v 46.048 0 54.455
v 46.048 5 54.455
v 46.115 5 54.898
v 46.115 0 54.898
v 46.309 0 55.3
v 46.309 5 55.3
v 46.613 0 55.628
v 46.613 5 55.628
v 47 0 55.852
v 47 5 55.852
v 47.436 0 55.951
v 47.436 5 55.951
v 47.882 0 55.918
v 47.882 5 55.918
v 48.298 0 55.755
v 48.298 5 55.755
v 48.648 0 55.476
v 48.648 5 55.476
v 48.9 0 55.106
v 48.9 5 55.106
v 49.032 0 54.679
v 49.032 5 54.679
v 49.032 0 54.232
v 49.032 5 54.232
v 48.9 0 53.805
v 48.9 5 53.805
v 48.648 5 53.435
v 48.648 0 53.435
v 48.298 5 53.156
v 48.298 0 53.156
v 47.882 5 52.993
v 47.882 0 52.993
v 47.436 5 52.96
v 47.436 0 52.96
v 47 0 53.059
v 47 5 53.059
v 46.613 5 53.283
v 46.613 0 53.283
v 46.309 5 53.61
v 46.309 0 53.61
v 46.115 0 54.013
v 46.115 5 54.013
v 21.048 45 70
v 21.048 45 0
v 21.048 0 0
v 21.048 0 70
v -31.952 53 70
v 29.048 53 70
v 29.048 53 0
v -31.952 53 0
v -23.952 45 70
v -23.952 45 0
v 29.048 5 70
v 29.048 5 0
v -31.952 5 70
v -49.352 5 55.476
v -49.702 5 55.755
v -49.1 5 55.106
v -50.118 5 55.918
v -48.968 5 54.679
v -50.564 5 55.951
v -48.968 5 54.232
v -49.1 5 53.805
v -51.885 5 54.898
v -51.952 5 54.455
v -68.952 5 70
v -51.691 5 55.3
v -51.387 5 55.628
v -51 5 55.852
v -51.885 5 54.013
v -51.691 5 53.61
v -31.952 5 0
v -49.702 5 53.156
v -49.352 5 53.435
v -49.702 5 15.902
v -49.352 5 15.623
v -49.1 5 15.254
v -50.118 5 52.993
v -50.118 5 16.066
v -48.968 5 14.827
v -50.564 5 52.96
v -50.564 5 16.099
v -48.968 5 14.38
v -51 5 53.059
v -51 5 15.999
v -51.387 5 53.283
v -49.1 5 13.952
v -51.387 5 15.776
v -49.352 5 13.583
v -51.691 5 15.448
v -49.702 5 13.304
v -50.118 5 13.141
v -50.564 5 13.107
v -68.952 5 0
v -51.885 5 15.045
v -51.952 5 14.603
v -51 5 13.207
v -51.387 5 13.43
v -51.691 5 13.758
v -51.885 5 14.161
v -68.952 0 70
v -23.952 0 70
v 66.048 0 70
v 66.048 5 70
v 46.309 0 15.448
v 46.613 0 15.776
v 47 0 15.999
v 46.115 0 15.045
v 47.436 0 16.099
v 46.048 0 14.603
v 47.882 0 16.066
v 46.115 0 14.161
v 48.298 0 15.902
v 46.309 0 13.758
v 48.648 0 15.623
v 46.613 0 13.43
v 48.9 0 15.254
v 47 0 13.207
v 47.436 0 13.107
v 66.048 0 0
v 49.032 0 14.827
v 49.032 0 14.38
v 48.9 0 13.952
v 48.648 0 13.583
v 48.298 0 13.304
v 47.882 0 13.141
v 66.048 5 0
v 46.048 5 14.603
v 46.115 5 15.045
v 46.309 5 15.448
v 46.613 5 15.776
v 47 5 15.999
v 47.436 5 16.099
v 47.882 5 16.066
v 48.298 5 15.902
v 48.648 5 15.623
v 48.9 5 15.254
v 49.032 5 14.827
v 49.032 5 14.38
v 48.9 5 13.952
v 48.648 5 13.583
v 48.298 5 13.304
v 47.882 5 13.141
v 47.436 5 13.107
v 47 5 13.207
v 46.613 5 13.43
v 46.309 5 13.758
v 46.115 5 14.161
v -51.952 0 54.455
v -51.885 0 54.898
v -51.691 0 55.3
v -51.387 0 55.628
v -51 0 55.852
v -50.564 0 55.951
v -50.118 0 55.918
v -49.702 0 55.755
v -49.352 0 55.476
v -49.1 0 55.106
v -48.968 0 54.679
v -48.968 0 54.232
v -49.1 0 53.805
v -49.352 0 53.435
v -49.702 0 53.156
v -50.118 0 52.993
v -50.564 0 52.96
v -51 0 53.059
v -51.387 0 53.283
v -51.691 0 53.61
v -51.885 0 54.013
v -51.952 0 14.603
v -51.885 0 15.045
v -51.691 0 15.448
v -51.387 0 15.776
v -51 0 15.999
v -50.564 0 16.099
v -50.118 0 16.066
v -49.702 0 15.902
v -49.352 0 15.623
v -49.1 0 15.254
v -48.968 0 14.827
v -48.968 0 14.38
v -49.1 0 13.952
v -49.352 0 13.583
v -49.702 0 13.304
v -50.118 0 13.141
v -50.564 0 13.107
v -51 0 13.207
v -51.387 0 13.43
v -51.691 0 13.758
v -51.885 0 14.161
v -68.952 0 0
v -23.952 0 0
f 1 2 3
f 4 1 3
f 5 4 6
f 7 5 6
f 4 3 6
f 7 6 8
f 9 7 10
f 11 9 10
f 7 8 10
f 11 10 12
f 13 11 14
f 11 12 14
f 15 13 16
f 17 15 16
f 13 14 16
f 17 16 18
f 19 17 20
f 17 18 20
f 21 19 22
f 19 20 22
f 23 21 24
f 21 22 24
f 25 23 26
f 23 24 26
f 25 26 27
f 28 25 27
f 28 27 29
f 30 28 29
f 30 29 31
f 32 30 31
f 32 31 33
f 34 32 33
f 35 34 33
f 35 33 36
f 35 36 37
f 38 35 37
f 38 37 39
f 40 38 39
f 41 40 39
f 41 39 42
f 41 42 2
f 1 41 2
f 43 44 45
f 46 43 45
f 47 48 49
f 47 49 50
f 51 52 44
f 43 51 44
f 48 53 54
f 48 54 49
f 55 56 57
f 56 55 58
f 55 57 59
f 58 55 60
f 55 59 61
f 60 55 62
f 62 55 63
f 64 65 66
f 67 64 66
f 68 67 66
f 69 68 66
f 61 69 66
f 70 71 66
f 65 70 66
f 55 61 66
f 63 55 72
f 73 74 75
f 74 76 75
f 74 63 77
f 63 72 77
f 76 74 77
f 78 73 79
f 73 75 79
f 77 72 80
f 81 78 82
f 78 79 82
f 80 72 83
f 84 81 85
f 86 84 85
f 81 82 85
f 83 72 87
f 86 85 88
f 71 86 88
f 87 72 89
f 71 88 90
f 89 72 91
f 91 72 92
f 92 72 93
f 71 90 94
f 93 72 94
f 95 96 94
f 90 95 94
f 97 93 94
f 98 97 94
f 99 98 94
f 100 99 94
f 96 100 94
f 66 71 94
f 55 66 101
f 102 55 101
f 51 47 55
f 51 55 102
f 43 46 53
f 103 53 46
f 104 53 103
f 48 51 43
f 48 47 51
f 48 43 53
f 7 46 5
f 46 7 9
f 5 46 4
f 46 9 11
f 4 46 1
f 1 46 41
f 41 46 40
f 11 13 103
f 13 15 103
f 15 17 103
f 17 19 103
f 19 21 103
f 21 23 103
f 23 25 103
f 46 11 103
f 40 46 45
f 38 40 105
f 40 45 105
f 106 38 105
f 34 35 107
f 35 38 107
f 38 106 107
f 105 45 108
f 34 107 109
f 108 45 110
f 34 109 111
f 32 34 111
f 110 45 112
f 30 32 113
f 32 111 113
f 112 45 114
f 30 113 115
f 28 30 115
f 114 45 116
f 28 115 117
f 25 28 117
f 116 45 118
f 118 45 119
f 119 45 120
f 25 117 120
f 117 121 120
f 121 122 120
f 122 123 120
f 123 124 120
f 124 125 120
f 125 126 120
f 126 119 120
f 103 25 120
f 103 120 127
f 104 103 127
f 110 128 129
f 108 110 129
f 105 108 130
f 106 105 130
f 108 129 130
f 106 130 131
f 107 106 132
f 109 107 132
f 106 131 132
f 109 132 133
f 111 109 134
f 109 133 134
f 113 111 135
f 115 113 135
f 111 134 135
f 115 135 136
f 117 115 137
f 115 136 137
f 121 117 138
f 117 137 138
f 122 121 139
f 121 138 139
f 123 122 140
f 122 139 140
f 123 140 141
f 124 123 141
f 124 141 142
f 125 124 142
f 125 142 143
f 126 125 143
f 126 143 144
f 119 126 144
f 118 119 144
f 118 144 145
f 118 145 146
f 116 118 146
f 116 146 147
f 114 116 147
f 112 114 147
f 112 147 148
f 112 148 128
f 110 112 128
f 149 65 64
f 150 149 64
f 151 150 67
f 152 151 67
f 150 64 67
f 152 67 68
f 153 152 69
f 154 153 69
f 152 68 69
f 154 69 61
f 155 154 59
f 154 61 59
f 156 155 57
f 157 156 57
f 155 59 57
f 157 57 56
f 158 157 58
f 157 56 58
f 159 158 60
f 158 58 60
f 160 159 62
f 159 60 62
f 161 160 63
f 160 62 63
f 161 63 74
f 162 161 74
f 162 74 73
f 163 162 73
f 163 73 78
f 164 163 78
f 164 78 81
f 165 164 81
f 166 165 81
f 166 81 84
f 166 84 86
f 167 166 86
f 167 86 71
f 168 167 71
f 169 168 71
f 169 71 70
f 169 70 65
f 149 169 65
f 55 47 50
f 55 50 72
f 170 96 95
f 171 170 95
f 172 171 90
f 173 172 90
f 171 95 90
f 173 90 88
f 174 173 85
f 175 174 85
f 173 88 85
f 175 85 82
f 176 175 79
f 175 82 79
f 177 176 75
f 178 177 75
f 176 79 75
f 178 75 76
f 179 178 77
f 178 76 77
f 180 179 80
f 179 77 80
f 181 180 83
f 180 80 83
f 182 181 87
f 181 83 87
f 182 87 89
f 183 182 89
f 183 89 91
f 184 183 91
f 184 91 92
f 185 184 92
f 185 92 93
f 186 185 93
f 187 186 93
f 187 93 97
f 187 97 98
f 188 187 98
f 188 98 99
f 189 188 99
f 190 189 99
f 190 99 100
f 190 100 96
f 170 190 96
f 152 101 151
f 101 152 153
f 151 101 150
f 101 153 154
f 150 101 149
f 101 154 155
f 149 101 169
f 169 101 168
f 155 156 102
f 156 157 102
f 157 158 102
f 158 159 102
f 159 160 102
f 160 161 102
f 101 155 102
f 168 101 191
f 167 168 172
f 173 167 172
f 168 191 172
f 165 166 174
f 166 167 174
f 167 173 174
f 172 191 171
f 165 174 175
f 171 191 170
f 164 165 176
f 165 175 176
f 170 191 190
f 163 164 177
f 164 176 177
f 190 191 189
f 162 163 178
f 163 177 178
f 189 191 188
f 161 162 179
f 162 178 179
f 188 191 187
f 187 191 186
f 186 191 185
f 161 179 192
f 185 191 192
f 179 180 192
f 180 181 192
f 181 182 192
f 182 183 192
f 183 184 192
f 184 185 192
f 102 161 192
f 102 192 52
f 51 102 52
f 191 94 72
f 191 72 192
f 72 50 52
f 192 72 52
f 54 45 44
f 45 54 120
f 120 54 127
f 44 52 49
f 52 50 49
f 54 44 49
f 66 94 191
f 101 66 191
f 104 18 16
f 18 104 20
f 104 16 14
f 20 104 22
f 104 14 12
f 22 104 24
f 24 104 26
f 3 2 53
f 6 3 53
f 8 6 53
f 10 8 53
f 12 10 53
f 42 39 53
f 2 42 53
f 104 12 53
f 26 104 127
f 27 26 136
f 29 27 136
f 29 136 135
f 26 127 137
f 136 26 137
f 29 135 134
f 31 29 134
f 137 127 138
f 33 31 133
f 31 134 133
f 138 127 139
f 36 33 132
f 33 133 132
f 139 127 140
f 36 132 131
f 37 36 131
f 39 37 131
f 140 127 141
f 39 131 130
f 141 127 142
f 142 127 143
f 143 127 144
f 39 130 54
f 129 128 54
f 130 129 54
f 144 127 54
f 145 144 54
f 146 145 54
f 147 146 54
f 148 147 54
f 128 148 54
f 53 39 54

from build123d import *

# Parameters (mm, degrees)
BOSS_EXTRUDE1_DEPTH = 70
SKETCH6_R           = 1.5
CUT_EXTRUDE1_DEPTH  = 70


with BuildPart() as part:
    # Sketch1 → Boss-Extrude1 (new body)
    with BuildSketch(Plane.XY):
        Polygon((-68.951612903, 0), (-23.951612903, 0), (-23.951612903, 45), (21.048387097, 45), (21.048387097, 0), (66.048387097, 0), (66.048387097, 5), (29.048387097, 5), (29.048387097, 53), (-31.951612903, 53), (-31.951612903, 5), (-68.951612903, 5), align=None)
    extrude(amount=BOSS_EXTRUDE1_DEPTH)

    # Sketch6 → Cut-Extrude1 (cut)
    with BuildSketch(Plane(origin=(0, 5, 0), x_dir=(1, 0, 0), z_dir=(0, 1, 0))):
        with Locations(Location((-50.451612903, -14.603137979, 0), (0, 0, 180))):
            Circle(SKETCH6_R)
        with Locations(Location((-50.451612903, -54.455468389, 0), (0, 0, 180))):
            Circle(SKETCH6_R)
        with Locations(Location((47.548387097, -14.603137979, 0), (0, 0, 180))):
            Circle(SKETCH6_R)
        with Locations(Location((47.548387097, -54.455468389, 0), (0, 0, 180))):
            Circle(SKETCH6_R)
    extrude(amount=-CUT_EXTRUDE1_DEPTH, mode=Mode.SUBTRACT)


solid = part.part
